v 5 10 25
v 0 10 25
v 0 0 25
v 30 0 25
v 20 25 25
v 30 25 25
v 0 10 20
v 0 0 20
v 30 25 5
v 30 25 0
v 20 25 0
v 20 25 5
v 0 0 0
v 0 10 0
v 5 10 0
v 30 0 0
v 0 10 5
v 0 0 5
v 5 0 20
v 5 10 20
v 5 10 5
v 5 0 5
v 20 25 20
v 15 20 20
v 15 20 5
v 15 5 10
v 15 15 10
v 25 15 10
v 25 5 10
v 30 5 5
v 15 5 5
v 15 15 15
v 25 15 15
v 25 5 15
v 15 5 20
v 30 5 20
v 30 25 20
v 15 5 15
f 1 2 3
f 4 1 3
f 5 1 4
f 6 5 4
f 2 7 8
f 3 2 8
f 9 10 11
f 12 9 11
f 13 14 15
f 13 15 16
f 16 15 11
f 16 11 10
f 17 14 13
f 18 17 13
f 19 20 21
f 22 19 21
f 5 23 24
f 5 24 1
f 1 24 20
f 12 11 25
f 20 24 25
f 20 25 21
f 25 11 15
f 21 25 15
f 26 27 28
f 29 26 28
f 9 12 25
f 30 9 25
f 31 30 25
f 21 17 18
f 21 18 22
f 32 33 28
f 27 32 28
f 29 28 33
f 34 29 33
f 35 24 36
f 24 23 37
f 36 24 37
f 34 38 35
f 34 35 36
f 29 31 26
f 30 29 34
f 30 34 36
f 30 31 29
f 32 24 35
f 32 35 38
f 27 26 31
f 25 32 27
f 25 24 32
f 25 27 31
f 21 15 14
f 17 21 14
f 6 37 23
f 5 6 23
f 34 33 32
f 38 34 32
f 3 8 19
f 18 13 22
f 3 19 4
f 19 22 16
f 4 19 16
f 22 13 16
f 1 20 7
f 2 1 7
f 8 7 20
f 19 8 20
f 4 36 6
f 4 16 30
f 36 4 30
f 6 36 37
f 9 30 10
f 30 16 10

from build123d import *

# Parameters (mm, degrees)
BOSS_EXTRUDE1_DEPTH = 25
SKETCH2_W           = 5
SKETCH2_H           = 15
CUT_EXTRUDE1_DEPTH  = 25
SKETCH3_W           = 5
SKETCH3_H           = 5
CUT_EXTRUDE2_DEPTH  = 20
SKETCH4_W           = 5
SKETCH4_H           = 10
CUT_EXTRUDE3_DEPTH  = 10


with BuildPart() as part:
    # Sketch1 → Boss-Extrude1 (new body)
    with BuildSketch(Plane.XY):
        Polygon((0, 0), (30, 0), (30, 25), (20, 25), (5, 10), (0, 10), align=None)
    extrude(amount=BOSS_EXTRUDE1_DEPTH)

    # Sketch2 → Cut-Extrude1 (cut)
    with BuildSketch(Plane(origin=(0, 10, 0), x_dir=(1, 0, 0), z_dir=(0, 1, 0))):
        with Locations((2.5, -12.5)):
            Rectangle(SKETCH2_W, SKETCH2_H)
    extrude(amount=-CUT_EXTRUDE1_DEPTH, mode=Mode.SUBTRACT)

    # Sketch3 → Cut-Extrude2 (cut)
    with BuildSketch(Plane(origin=(0, 25, 0), x_dir=(1, 0, 0), z_dir=(0, 1, 0))):
        Polygon((30, -20), (30, -5), (20, -5), (20, -10), (25, -10), (25, -15), (20, -15), (20, -20), align=None)
        with Locations((17.5, -7.5)):
            Rectangle(SKETCH3_W, SKETCH3_H)
        with Locations((17.5, -17.5)):
            Rectangle(SKETCH3_W, SKETCH3_H)
    extrude(amount=-CUT_EXTRUDE2_DEPTH, mode=Mode.SUBTRACT)

    # Sketch4 → Cut-Extrude3 (cut)
    with BuildSketch(Plane(origin=(25, 0, 0), x_dir=(0, 0, -1), z_dir=(1, 0, 0))):
        with Locations((-12.5, 20)):
            Rectangle(SKETCH4_W, SKETCH4_H)
    extrude(amount=-CUT_EXTRUDE3_DEPTH, mode=Mode.SUBTRACT)


solid = part.part
